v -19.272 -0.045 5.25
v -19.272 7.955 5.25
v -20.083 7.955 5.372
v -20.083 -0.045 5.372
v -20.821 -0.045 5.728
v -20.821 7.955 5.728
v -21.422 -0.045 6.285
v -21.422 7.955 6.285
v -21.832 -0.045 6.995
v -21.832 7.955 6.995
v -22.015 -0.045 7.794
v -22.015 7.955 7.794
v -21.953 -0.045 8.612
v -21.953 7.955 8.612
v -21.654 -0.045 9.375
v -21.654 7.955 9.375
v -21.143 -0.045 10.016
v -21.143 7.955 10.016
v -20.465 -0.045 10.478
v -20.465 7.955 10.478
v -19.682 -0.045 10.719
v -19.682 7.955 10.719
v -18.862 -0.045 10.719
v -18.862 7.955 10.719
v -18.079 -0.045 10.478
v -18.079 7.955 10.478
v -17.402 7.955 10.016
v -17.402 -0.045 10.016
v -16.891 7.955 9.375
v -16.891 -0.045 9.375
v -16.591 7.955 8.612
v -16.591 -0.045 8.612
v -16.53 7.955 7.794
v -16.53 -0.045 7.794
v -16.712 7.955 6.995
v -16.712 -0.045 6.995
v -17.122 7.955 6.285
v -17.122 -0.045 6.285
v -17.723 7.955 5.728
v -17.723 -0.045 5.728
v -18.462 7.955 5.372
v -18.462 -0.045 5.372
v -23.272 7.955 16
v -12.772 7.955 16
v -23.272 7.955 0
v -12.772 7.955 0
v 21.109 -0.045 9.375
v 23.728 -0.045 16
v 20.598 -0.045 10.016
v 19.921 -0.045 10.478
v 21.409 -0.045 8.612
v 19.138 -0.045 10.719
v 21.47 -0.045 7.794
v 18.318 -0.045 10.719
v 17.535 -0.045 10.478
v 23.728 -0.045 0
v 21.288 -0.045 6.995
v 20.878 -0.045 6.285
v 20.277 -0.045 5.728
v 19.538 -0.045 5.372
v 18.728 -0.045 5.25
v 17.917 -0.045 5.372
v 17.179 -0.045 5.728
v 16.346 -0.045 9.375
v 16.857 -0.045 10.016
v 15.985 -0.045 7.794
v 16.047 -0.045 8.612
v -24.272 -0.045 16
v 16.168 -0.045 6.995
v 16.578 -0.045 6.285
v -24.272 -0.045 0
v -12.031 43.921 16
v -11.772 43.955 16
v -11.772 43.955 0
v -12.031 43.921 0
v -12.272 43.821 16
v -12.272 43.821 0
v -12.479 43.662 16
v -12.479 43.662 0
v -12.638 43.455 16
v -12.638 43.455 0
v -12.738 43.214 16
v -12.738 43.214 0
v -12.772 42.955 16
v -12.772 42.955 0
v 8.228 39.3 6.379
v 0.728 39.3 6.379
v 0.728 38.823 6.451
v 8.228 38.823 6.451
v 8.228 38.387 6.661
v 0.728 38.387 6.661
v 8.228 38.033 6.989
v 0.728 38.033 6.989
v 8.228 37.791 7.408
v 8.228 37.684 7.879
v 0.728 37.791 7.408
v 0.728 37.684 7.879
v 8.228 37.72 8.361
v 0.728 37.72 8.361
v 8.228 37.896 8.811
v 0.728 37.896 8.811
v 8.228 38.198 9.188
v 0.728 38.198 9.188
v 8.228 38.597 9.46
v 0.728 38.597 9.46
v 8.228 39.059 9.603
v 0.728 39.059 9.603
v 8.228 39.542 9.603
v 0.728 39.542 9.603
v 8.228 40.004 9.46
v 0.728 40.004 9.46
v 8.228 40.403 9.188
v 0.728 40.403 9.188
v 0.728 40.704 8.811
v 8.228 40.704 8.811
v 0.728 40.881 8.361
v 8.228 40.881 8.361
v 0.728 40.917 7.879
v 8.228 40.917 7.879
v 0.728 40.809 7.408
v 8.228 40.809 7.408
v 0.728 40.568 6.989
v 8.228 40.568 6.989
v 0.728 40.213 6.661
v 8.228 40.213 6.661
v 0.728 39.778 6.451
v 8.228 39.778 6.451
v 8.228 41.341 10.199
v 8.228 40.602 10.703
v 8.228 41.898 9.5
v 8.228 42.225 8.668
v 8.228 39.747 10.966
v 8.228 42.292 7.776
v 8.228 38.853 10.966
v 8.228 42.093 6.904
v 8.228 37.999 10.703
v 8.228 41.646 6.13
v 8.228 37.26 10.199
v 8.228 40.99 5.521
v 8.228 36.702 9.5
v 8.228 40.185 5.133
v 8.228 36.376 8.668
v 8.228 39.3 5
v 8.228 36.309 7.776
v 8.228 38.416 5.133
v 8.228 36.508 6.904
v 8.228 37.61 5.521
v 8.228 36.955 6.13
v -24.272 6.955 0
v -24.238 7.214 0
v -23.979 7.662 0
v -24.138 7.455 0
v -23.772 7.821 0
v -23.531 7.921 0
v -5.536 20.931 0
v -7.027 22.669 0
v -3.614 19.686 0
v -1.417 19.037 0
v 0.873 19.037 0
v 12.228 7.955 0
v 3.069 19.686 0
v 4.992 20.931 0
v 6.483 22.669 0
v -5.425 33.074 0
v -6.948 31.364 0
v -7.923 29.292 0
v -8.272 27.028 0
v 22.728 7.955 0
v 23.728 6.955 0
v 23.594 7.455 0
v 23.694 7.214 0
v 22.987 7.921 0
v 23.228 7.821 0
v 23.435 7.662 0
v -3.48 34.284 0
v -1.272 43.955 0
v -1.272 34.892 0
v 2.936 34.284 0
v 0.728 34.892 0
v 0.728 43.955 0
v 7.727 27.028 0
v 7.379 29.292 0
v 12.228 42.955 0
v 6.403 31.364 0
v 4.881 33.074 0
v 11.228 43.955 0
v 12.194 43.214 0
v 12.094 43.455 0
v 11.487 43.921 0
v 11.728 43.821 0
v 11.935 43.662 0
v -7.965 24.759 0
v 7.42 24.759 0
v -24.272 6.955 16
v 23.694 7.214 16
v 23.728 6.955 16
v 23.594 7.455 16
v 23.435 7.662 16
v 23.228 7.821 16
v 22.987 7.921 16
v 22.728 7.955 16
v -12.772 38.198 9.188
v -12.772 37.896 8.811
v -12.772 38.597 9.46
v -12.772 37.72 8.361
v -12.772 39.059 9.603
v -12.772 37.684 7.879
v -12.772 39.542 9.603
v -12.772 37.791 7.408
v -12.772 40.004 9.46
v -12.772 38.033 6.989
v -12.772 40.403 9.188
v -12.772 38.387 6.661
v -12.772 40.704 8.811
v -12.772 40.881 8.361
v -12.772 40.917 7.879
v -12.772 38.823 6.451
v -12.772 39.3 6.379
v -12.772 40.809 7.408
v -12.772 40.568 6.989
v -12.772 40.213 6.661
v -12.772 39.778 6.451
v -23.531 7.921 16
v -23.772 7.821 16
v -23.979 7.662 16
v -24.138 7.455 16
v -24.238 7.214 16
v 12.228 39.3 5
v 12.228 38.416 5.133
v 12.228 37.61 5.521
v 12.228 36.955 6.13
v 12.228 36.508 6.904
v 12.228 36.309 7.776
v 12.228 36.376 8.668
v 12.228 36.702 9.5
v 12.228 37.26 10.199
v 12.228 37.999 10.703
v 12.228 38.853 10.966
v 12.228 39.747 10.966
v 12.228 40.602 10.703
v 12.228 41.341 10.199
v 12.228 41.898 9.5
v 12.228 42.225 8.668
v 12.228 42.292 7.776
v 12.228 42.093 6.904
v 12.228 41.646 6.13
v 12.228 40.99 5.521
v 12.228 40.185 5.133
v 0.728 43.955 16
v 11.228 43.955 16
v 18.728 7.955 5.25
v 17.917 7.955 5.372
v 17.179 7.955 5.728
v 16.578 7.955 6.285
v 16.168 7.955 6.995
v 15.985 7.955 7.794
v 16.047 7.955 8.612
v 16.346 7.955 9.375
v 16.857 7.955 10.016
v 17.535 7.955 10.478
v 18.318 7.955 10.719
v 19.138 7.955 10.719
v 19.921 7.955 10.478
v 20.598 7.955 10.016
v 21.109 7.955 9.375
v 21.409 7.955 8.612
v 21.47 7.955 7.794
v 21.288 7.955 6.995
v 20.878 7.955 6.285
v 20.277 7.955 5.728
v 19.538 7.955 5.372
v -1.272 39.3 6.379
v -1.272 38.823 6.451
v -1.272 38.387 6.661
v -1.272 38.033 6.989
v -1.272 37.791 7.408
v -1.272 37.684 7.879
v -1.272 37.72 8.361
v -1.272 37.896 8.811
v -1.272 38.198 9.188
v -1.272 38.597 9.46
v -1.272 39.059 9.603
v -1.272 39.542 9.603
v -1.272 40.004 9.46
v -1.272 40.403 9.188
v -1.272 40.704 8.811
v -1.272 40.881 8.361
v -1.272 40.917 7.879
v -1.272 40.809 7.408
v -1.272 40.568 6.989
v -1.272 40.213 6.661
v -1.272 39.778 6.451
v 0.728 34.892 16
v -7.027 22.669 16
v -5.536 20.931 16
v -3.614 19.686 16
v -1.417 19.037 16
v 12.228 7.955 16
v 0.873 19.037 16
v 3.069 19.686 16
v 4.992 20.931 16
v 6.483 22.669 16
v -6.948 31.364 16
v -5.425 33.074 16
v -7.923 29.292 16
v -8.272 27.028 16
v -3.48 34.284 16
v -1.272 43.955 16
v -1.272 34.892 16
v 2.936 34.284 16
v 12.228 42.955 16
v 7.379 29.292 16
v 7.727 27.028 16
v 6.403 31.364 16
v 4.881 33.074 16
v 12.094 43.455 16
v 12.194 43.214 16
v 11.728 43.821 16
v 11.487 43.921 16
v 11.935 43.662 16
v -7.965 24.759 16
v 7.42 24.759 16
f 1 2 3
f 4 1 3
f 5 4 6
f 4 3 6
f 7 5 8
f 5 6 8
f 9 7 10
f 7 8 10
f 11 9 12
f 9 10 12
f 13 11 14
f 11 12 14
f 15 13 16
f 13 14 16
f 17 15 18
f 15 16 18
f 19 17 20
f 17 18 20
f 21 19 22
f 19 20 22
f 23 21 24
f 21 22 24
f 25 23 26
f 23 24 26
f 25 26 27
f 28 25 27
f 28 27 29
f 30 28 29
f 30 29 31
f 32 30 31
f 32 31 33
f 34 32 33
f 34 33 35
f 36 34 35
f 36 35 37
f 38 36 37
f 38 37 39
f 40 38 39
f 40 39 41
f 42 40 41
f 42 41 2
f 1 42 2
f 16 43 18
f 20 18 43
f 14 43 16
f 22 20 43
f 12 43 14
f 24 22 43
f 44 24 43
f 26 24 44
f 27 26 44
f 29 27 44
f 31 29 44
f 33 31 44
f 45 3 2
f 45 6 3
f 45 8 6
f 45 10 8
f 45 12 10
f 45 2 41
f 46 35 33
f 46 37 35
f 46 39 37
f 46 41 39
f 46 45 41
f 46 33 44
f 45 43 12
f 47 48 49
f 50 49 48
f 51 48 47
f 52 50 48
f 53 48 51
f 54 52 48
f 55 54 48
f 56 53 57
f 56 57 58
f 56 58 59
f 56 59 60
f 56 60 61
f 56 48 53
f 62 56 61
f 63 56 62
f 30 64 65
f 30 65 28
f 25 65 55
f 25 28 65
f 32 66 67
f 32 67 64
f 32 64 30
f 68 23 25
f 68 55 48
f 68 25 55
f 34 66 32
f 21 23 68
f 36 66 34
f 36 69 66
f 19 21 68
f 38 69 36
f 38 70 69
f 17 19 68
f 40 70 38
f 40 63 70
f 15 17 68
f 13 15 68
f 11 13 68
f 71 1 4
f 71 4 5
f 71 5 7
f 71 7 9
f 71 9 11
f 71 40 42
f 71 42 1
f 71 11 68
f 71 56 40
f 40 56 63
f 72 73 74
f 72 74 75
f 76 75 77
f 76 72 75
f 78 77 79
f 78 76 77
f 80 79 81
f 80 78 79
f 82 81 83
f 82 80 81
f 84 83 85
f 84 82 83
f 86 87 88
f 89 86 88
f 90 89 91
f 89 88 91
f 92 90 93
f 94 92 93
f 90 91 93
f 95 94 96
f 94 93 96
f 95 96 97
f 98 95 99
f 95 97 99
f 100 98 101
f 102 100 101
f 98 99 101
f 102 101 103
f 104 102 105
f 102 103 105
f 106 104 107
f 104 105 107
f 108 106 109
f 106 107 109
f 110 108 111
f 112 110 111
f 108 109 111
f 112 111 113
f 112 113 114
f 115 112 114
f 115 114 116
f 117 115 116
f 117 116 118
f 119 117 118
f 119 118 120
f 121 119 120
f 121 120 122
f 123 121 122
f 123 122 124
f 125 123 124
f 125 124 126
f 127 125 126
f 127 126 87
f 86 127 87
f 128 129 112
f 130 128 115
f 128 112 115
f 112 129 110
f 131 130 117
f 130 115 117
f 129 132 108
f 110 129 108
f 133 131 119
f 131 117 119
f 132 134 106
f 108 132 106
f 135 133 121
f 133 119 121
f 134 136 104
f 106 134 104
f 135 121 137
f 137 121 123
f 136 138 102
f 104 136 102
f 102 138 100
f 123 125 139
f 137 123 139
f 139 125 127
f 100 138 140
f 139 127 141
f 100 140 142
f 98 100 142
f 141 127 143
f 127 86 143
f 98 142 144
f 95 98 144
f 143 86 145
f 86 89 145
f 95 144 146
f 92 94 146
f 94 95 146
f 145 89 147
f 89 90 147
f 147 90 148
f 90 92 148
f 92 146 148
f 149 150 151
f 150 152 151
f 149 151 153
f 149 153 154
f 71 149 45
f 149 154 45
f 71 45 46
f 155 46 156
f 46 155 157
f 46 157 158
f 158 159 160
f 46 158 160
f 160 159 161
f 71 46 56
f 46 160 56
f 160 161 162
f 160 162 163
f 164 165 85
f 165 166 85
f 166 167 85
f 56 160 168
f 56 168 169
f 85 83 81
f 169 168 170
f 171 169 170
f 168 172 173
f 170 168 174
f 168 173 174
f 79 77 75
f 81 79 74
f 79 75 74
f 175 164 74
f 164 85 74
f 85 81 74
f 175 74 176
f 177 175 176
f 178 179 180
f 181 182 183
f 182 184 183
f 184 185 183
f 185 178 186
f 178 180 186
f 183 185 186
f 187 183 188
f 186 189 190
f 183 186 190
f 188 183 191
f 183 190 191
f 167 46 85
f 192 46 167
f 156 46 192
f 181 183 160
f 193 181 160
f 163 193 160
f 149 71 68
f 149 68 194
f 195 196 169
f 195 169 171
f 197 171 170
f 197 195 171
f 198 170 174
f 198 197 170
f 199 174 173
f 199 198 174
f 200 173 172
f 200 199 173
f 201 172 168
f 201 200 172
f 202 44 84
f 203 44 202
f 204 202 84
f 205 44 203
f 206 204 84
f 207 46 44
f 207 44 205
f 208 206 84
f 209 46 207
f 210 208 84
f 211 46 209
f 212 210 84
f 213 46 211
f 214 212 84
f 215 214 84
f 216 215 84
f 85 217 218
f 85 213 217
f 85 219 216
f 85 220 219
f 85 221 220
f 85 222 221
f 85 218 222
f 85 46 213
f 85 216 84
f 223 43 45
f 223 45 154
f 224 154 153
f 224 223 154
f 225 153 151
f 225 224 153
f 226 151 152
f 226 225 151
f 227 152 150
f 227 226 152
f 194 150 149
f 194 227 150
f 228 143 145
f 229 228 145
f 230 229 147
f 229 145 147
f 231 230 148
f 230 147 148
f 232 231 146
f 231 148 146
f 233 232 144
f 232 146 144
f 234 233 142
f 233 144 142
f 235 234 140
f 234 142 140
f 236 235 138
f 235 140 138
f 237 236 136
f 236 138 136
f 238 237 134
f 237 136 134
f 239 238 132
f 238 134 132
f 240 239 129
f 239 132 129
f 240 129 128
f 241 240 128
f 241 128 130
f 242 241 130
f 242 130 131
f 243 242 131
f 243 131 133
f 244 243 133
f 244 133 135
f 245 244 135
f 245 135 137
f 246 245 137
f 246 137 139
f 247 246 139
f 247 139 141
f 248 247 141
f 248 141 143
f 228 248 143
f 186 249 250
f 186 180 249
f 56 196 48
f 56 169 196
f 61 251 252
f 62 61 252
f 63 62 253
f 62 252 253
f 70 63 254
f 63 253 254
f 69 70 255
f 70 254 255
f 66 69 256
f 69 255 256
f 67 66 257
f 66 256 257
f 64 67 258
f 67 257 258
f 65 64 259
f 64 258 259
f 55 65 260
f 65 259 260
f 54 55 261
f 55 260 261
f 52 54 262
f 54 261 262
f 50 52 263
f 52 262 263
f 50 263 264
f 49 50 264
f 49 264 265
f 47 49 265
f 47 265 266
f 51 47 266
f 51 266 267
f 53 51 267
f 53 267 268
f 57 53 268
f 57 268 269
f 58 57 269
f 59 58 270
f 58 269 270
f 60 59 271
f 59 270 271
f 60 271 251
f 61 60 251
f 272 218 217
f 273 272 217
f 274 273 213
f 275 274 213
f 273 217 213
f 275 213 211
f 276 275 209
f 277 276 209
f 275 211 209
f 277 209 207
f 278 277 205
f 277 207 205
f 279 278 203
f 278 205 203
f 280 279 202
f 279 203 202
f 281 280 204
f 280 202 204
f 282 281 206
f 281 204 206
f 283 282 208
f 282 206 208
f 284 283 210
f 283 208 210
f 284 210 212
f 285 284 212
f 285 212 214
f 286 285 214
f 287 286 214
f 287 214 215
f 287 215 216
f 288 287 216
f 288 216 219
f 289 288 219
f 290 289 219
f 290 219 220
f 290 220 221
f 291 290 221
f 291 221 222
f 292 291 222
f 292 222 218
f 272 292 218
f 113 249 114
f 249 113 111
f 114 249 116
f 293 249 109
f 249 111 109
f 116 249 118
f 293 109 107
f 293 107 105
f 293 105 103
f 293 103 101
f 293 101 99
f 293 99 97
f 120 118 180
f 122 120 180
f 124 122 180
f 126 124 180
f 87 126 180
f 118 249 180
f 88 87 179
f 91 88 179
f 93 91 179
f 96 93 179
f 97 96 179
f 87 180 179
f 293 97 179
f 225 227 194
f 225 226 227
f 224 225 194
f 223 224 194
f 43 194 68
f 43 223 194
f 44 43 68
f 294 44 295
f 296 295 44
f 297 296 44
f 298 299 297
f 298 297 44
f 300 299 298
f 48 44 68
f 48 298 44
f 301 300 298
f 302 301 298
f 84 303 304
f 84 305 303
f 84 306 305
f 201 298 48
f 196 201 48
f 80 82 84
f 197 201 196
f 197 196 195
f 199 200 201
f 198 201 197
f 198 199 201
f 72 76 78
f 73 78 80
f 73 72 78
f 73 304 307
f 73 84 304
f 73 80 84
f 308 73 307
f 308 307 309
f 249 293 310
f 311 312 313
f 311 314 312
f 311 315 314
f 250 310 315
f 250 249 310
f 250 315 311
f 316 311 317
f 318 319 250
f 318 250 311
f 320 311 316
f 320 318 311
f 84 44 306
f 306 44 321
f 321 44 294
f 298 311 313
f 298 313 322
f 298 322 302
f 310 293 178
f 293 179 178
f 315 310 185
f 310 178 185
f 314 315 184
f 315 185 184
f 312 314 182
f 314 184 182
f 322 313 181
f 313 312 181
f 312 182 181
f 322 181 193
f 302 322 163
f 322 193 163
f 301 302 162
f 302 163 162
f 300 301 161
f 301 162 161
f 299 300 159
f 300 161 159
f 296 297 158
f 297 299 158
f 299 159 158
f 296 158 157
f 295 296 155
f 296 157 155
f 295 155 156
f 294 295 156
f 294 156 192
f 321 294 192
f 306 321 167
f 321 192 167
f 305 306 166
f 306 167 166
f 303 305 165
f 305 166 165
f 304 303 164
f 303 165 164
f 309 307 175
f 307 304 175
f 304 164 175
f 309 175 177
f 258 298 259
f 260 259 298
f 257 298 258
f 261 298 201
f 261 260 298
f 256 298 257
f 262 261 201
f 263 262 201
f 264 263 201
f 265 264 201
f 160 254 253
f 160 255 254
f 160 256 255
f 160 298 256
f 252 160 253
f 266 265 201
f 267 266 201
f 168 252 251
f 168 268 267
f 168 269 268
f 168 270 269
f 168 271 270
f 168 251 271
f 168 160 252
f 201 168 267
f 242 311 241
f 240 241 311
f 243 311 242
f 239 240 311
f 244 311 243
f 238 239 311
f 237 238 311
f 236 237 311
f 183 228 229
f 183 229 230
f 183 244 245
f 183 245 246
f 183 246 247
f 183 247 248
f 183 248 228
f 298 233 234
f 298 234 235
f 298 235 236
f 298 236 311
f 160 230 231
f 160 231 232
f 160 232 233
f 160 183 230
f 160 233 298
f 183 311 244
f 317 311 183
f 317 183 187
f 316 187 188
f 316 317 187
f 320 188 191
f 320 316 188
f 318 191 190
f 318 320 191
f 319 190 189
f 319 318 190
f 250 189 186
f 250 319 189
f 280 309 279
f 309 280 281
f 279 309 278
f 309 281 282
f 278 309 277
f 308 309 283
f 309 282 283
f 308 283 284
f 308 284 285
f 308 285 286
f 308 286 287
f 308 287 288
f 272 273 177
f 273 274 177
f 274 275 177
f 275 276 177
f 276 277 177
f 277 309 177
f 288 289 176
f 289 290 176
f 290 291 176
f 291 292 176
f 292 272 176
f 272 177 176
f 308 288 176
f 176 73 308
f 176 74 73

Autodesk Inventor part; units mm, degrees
ref_plane "YZ Plane" through (0, 0, 0) normal (1, 0, 0) x (0, 1, 0)
ref_plane "XZ Plane" through (0, 0, 0) normal (0, 1, 0) x (-1, 0, 0)
ref_plane "XY Plane" through (0, 0, 0) normal (0, 0, 1) x (1, 0, 0)
sketch "Esboço1" plane through (0, 0, 0) normal (0, 0, 1) x (1, 0, 0)
  line L0 (23.7277, -0.0451) -> (-24.2723, -0.0451)
  line L1 (-24.2723, -0.0451) -> (-24.2723, 7.9549)
  line L2 (23.7277, 7.9549) -> (23.7277, -0.0451)
  line L3 (12.2277, 43.9549) -> (12.2277, 7.9549)
  line L4 (-12.7723, 7.9549) -> (-12.7723, 43.9549)
  arc A0 (-1.2723, 34.8922) -> (0.7277, 34.8922) centre (-0.2723, 26.9549) ccw
  line L5 (-24.2723, 7.9549) -> (-12.7723, 7.9549)
  line L6 (12.2277, 7.9549) -> (23.7277, 7.9549)
  line L7 (0.7277, 43.9549) -> (0.7277, 34.8922)
  line L8 (-1.2723, 34.8922) -> (-1.2723, 43.9549)
  line L9 (-12.7723, 43.9549) -> (-1.2723, 43.9549)
  line L10 (0.7277, 43.9549) -> (12.2277, 43.9549)
  point P0 (-0.2723, 43.9549)
  dimension "largura" = 48
  dimension "largura_topo" = 25
  dimension "altura_base" = 8
  dimension "diametro" = 16
  dimension "altura_furo" = 27
  dimension "d6" = 11.5
  dimension "d7" = 12.5
  dimension "d8" = 8
  dimension "d10" = 11.5
  dimension "d11" = 11.5
extrude "Extrusão1" add sketch "Esboço1" along normal blind 16
sketch "Esboço2" plane through (12.2277, 7.9549, 0) normal (1, 0, 0) x (0, 0, -1)
  line L0 (0, 26.9373) -> (-16, 26.9373) projected
  line L1 (-8, 26.9373) -> (-8, 35.7534) construction
  circle A0 centre (-8, 31.3453) radius 1.1711 construction
  point P0 (0, -7.9549)
hole "Furo1" at (12.2277, 39.3003, 8) direction (-1, 0, 0) diameter 3.242 end through all counterbore diameter 6 counterbore depth 4 thread size "M4x0.7" class "6H" standard "ANSI Metric M Profile"
sketch "Esboço3" plane through (-24.2723, -0.0451, 0) normal (0, -1, 0) x (1, 0, 0)
  line L0 (5, 8) -> (43, 8) construction
  circle A0 centre (5, 8) radius 1 construction
  circle A1 centre (43, 8) radius 1 construction
  line L1 (48, 0) -> (0, 0) construction
  line L2 (24, 0) -> (24, 16) construction
  line L3 (0, 16) -> (48, 16) construction
  point P0 (24, 8)
  dimension "distancia_parafusos" = 38
  dimension "d22" = 2
  dimension "d23" = 2
hole "Furo2" at (-19.2723, -0.0451, 8) at (18.7277, -0.0451, 8) direction (0, 1, 0) diameter 5.5 end through all
fillet "Arredondamento1" radius 1 4 edges at (12.2277, 43.9549, 8) (-12.7723, 43.9549, 8) (-24.2723, 7.9549, 8) (23.7277, 7.9549, 8)
equation "\"d6\" = -0.5 * largura_topo + 0.5 * largura"
equation "\"d7\" = 0.5 * largura_topo"
equation "\"d8\" = altura_base"
equation "\"d11\" = d10"
properties part number "Sk16"
